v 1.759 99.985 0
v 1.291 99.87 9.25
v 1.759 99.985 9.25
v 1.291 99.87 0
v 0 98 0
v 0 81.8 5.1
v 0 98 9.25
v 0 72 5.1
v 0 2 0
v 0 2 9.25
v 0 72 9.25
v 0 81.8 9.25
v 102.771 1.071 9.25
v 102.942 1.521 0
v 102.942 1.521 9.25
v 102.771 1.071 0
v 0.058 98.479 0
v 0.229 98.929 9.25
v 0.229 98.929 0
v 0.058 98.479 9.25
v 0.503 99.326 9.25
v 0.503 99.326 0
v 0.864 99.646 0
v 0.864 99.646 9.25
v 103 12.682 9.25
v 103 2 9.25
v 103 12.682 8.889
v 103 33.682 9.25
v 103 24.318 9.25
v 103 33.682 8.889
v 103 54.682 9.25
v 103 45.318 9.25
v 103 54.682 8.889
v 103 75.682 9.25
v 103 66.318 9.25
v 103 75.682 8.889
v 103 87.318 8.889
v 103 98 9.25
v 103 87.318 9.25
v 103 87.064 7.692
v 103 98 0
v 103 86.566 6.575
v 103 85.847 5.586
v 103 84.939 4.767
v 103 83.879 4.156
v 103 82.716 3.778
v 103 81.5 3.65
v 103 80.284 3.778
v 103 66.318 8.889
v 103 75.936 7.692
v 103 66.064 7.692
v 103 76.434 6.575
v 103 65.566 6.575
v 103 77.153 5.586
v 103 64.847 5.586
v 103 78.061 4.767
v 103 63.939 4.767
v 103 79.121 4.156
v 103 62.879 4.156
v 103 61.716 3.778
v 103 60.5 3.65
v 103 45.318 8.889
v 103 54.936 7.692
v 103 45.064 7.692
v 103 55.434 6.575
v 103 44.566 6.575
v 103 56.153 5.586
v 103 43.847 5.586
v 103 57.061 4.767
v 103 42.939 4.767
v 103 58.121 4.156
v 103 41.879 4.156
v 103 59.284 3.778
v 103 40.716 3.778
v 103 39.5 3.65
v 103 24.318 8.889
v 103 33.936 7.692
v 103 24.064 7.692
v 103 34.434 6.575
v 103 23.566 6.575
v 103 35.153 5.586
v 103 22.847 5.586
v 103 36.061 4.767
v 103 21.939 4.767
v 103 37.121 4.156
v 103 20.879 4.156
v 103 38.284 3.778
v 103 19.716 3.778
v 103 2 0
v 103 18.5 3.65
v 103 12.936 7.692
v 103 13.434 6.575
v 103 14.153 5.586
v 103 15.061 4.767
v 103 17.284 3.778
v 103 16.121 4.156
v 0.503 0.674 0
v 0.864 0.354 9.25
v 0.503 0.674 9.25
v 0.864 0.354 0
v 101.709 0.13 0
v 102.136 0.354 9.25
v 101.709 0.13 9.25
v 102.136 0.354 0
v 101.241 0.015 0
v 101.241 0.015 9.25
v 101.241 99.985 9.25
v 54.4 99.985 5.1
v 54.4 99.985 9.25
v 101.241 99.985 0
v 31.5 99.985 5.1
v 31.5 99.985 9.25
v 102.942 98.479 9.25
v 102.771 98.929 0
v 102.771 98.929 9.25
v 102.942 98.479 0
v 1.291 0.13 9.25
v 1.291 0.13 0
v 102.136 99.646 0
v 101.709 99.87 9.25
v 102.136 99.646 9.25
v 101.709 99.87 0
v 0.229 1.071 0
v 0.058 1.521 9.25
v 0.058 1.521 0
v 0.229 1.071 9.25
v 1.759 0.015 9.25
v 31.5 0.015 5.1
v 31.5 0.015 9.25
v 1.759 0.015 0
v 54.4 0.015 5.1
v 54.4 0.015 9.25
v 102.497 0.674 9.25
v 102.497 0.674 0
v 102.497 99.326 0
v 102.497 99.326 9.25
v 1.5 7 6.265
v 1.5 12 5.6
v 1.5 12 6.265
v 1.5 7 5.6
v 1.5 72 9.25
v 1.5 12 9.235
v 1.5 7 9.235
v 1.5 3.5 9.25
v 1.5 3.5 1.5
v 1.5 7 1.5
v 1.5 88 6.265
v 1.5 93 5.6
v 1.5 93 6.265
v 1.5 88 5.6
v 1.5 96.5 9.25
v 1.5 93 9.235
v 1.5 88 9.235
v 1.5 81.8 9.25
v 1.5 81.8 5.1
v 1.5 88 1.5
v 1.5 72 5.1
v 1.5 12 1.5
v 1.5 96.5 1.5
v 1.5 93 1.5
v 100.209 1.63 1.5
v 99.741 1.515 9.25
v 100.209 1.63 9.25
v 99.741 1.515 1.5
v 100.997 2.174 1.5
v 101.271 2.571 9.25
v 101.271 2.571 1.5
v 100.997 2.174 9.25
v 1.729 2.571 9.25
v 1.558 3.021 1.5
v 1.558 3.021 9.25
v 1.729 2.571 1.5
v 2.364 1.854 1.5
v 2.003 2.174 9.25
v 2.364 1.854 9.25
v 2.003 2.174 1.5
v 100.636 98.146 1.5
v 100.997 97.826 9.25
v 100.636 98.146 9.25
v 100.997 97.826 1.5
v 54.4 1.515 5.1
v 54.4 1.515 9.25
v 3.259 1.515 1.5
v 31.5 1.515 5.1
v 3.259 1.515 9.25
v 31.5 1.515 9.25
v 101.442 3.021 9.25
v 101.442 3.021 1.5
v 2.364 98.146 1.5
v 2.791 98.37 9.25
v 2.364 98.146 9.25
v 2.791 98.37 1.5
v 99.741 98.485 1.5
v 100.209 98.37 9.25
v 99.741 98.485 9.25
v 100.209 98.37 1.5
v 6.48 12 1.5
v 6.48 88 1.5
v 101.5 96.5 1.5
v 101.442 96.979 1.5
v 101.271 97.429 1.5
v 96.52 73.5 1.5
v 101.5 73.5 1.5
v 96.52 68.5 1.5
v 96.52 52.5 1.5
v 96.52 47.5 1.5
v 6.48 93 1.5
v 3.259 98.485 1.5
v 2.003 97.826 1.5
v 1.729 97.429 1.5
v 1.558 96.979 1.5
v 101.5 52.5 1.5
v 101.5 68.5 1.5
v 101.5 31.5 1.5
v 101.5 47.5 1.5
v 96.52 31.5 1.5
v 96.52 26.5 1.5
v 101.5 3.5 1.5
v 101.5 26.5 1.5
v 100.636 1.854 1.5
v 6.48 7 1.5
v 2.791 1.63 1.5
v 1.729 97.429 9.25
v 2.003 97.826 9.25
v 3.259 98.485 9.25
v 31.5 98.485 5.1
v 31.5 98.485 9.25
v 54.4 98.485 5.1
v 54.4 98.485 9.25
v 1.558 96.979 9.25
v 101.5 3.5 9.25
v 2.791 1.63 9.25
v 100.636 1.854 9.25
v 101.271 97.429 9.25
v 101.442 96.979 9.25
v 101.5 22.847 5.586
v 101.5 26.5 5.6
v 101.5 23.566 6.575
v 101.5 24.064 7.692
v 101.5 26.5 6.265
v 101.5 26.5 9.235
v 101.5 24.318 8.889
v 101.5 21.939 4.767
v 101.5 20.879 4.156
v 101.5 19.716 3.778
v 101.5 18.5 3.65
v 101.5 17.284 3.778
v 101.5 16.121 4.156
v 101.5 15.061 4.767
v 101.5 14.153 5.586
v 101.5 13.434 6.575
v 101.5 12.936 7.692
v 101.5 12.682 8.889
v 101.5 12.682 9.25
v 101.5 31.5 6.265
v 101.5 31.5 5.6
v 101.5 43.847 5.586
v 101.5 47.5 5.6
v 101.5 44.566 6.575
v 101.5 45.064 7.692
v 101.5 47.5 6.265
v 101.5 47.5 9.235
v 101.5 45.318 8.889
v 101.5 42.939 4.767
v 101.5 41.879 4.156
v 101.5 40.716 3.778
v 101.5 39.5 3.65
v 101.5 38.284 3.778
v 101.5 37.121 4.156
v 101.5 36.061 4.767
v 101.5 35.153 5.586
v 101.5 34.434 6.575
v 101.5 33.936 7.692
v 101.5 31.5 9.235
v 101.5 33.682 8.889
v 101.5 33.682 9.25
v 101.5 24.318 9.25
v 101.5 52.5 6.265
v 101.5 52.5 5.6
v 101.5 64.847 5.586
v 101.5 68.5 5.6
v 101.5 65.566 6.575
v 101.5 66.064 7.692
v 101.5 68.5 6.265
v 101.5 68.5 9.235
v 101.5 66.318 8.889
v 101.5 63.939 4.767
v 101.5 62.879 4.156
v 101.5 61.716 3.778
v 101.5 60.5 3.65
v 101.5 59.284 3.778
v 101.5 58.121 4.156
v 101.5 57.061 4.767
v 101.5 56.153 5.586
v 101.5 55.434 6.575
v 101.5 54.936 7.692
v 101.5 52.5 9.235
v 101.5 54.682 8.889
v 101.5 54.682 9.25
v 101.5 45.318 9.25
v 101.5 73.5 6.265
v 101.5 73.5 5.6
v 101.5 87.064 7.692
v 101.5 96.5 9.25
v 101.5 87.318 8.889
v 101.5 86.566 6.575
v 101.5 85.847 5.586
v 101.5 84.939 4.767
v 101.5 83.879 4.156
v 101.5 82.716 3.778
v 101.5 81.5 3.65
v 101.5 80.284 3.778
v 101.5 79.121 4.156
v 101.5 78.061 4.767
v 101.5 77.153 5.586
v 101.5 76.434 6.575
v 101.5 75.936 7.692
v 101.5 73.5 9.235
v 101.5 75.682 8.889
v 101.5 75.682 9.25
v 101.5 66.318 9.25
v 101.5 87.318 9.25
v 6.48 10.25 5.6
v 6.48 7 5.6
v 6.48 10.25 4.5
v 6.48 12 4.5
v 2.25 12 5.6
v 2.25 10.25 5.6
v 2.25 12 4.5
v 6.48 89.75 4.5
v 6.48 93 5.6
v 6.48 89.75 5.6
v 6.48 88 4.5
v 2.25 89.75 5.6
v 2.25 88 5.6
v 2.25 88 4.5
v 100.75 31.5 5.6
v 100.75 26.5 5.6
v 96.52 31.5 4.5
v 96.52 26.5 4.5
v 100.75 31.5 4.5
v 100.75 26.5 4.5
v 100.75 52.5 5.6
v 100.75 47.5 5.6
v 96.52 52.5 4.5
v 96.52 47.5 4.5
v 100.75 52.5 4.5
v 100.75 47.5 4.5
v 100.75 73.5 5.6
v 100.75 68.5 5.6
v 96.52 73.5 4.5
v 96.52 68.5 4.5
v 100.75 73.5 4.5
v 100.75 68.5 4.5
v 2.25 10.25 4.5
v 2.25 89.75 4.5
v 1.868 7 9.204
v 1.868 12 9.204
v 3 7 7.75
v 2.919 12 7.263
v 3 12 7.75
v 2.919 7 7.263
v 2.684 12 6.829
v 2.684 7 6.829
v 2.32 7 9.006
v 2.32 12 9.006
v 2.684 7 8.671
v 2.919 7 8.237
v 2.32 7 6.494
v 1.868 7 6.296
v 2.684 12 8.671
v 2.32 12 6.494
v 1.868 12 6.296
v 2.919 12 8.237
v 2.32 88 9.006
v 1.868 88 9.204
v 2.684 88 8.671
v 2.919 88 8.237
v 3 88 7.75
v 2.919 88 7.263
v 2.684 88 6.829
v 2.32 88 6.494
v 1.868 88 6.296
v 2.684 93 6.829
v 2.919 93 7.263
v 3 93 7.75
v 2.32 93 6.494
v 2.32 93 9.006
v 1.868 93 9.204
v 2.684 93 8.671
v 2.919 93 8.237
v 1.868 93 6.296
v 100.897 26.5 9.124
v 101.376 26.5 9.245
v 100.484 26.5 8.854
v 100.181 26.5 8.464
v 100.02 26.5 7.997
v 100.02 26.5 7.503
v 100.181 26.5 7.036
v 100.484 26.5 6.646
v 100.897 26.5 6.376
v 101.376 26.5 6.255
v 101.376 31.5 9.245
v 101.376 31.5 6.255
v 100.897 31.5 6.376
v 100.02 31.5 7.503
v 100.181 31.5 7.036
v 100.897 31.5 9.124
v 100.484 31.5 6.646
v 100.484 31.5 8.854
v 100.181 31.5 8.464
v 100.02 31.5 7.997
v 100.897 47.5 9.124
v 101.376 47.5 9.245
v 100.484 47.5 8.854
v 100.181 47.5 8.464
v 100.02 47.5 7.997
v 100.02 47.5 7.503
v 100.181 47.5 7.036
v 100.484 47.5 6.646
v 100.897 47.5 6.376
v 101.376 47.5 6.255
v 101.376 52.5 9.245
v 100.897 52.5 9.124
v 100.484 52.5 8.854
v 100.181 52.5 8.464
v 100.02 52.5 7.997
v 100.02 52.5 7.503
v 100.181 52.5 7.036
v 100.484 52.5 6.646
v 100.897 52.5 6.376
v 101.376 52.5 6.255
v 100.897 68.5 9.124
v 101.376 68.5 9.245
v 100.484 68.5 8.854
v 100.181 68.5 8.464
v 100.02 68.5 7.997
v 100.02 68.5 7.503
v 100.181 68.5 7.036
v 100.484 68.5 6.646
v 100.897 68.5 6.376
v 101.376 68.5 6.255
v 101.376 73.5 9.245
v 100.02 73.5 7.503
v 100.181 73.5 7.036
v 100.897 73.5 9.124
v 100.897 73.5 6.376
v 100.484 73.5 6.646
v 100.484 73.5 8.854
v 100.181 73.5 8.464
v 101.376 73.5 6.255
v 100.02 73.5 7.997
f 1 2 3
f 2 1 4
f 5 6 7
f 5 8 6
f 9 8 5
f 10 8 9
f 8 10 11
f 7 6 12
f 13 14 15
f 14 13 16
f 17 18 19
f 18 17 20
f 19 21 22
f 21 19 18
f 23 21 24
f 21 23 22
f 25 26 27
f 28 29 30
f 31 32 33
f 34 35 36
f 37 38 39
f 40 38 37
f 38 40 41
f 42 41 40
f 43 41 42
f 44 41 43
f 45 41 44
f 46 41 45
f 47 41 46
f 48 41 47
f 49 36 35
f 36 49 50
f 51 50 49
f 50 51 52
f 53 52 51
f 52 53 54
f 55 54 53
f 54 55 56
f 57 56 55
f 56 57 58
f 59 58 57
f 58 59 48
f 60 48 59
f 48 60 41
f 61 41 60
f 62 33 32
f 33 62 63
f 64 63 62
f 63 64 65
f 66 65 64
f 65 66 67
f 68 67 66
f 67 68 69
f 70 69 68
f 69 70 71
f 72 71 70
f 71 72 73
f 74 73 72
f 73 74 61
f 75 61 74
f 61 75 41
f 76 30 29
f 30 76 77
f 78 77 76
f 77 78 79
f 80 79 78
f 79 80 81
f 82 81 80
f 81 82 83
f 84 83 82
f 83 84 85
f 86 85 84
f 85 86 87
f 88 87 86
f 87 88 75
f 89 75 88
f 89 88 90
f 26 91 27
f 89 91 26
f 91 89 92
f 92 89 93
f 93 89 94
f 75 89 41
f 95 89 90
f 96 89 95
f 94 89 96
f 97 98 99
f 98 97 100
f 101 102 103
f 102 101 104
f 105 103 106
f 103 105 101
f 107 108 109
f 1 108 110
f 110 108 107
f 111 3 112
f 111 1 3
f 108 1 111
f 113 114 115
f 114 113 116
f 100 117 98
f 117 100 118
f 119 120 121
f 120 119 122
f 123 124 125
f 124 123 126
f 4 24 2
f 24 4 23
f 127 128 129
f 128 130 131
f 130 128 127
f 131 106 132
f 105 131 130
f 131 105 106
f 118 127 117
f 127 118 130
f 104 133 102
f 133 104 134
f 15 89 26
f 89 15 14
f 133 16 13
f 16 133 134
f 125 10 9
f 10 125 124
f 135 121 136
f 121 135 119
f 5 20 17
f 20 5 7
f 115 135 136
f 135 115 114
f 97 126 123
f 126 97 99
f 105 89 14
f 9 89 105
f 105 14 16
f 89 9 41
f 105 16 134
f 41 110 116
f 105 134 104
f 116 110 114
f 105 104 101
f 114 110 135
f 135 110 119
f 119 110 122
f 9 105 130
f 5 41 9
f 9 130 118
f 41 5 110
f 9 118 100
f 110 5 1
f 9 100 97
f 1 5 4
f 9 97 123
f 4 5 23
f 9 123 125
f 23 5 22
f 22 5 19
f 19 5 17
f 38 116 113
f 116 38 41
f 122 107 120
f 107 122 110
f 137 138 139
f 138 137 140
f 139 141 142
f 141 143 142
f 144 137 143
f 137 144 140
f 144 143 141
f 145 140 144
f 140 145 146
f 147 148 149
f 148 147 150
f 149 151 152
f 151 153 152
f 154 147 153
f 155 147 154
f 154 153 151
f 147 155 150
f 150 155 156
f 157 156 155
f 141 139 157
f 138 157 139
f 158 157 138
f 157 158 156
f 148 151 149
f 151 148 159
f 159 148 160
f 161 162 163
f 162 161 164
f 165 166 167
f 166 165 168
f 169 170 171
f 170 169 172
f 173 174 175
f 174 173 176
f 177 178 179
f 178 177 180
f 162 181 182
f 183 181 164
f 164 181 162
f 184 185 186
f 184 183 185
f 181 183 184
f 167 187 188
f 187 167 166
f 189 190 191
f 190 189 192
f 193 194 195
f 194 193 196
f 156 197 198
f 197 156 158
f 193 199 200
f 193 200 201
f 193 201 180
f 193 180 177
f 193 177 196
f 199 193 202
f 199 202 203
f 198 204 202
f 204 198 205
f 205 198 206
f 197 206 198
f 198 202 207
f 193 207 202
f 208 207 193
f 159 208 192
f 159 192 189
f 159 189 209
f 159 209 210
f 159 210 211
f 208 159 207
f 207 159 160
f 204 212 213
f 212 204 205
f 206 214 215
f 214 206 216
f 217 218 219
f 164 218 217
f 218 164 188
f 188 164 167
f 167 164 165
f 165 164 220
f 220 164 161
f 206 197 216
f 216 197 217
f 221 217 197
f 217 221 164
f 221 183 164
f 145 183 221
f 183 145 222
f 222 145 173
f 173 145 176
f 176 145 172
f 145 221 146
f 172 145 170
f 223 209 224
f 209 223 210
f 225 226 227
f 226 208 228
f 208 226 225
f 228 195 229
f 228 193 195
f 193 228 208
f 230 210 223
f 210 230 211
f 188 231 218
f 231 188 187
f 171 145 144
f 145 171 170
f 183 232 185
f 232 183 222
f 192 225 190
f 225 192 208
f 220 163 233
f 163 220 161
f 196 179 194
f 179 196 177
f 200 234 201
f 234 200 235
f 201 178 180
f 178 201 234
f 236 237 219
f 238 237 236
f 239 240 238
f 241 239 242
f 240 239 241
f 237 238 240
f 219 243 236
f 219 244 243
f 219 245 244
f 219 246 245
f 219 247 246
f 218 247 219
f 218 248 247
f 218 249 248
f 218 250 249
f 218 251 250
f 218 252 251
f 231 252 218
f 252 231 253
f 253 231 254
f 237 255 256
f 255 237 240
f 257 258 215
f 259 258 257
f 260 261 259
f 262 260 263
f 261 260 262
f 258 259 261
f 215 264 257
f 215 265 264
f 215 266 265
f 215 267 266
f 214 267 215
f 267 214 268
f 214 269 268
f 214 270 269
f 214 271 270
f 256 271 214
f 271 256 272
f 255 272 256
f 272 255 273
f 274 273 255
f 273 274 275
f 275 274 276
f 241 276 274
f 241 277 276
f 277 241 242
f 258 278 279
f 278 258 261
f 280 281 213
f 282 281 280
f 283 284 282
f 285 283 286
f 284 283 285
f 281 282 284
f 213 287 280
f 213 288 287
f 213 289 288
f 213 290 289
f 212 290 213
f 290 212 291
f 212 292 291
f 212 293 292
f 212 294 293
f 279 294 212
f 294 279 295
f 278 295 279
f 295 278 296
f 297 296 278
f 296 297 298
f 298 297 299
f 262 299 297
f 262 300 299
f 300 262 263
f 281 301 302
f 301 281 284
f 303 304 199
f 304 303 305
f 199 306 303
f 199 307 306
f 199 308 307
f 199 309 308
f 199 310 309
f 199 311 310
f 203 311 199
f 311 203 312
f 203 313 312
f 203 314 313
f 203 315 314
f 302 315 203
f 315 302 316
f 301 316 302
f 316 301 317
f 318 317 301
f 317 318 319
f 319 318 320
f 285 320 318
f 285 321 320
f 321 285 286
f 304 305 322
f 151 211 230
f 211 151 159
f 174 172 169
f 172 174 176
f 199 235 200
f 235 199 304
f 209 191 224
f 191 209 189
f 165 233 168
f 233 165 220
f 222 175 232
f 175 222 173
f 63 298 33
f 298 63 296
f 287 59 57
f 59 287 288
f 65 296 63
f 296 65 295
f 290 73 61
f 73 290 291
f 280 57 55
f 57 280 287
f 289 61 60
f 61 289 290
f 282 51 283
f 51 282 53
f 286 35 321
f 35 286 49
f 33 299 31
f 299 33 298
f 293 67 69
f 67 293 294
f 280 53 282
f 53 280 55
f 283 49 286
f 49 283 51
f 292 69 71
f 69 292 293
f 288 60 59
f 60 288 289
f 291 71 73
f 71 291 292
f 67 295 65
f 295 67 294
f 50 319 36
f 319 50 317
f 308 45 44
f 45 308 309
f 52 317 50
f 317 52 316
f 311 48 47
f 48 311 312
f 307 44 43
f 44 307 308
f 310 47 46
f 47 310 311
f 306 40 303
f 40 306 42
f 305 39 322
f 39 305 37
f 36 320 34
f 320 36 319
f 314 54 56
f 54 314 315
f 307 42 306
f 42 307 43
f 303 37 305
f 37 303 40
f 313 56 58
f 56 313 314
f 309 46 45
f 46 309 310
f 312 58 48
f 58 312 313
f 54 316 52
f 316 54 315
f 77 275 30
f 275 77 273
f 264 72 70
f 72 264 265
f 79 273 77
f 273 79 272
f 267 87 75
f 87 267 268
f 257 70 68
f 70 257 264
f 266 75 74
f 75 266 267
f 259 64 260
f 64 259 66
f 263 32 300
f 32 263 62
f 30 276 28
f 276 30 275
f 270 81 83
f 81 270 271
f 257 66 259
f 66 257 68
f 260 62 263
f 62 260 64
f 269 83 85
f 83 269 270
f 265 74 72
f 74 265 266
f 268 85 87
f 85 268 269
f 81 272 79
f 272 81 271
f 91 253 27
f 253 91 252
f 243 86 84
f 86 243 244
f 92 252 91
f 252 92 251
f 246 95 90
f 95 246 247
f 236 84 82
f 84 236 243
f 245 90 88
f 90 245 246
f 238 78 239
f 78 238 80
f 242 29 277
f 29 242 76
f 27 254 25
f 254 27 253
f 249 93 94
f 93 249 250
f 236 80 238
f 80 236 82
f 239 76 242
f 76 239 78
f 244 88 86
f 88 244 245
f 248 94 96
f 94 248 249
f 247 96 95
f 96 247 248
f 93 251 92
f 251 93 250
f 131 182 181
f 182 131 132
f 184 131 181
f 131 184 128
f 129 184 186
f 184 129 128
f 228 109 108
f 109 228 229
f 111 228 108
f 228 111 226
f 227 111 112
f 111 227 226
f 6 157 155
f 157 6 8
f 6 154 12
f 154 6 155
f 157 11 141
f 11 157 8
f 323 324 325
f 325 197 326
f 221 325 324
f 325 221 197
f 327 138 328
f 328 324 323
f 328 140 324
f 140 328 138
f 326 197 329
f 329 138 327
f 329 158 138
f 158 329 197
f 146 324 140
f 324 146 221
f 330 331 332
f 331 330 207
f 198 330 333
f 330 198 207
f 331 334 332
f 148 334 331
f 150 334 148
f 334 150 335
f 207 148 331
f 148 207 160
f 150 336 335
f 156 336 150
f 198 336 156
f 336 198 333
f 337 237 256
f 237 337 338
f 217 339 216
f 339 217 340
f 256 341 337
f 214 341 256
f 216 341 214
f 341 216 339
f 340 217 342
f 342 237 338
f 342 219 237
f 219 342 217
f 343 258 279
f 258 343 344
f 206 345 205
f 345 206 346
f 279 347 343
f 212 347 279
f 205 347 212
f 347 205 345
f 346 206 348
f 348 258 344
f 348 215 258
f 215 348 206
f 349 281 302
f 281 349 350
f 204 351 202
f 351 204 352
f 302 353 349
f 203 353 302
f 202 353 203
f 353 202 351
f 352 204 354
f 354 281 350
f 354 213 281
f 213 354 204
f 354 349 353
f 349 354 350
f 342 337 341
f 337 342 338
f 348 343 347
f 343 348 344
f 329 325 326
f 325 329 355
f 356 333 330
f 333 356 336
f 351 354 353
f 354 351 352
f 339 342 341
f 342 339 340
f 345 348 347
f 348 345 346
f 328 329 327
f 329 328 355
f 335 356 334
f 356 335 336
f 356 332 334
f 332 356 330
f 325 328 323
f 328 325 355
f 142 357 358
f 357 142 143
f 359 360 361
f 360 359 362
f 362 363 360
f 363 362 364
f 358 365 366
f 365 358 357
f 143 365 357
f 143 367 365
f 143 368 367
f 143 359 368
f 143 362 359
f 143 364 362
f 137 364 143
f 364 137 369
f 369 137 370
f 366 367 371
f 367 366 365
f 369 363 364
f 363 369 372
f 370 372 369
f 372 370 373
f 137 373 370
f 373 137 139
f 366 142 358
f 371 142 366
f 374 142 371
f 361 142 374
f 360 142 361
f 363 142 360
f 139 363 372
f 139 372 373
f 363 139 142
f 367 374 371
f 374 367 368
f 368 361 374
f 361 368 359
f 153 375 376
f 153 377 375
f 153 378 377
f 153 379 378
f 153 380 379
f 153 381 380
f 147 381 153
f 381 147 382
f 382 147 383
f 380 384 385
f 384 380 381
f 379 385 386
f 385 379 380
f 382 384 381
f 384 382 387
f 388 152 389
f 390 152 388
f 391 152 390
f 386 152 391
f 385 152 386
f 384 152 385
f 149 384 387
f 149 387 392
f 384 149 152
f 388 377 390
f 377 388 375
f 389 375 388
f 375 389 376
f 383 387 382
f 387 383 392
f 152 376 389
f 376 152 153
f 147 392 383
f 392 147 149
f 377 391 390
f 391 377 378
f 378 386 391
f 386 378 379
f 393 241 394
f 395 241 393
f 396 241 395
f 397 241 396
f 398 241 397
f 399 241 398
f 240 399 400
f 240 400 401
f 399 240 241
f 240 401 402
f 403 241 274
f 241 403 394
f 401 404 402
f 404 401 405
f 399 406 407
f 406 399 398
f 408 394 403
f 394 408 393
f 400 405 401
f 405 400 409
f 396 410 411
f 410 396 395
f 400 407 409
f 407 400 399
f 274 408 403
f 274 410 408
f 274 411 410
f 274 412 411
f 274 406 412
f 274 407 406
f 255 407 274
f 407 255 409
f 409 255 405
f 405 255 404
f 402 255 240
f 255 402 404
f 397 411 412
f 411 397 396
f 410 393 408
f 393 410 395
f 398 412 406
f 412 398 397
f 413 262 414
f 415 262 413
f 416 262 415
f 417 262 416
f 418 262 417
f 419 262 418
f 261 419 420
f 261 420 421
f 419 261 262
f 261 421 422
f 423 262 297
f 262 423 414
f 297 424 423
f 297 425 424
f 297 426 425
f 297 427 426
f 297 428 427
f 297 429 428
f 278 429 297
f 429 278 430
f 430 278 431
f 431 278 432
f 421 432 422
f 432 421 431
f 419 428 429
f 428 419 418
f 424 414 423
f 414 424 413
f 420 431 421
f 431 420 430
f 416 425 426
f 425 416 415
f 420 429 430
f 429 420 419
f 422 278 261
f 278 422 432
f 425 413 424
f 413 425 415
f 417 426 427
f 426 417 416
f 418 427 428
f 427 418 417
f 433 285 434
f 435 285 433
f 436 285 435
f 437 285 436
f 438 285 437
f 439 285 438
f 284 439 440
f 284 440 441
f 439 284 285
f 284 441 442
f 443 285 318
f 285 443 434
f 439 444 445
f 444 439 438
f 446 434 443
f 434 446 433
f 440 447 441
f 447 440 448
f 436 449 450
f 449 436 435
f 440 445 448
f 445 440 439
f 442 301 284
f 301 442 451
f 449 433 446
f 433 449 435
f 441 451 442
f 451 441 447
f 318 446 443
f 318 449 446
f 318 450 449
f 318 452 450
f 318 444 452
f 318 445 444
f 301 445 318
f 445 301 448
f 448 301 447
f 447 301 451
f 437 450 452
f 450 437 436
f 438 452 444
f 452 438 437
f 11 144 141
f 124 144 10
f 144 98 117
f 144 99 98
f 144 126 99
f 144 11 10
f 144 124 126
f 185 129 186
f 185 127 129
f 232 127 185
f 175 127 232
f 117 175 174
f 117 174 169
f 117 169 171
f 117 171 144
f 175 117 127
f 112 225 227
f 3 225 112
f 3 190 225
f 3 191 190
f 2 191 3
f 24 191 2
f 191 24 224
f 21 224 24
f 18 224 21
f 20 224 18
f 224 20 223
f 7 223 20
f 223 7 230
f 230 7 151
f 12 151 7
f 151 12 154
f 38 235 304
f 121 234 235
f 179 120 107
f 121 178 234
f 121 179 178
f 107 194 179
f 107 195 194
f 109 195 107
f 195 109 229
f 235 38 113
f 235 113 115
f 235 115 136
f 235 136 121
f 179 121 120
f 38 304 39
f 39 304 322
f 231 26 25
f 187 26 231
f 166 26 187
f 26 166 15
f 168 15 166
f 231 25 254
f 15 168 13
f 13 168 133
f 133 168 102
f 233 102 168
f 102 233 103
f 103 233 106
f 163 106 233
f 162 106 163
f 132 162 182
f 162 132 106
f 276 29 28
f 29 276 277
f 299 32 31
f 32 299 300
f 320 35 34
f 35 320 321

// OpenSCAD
// Case for a Haasoscope
//
// Copyright (C) 2022  Kevin O'Connor <kevin@koconnor.net>
//
// This file may be distributed under the terms of the GNU GPLv3 license.

board_length = 98;
board_width = 79;
board_height = 1.6;
board_height_components_bottom = 2;
board_height_components_top = 16.5;
coax_diameter = 9.7;
board_height_offset_coax = 3.4;
board_coax_width_separation = 21;
dupont_length = 20.9;
dupont_width = 9;
dupont_height = 2.5;
board_length_offset_dupont = 30;
double_switch_length = 19;
double_switch_length_left = 20;
double_switch_width = 3.6;
double_switch_height = 3.2;
board_length_offset_double_switch_outer = 16;
board_length_offset_double_switch_inner = 10;
board_width_offset_double_switch_outer = 3;
board_width_offset_double_switch_inner = (board_width-double_switch_width-10)/2;
topdupont_width = 5;
board_width_offset_topdupont_left = 13;
board_width_offset_topdupont_right = 11;
usb_width = 7.8;
usb_height = 2.8;
board_width_offset_usb = 6.7;
usbhi_length = 13.5;
usbhi_height = 7;
board_length_offset_usbhi = 7.5;
board_height_offset_usbhi = 8.25;
jtag_length = 20.25;
jtag_width = 9;
board_width_offset_jtag = 1.5;
board_length_offset_jtag = 4.5;
board_length_offset_hole = 12;

wall_size = 1.5;
post_size = 5;
corner_fillet = 2;

slack = 1;
CUT = 0.02;
$fs = 0.5;

// Full case
board_x = wall_size + slack;
board_y = wall_size + dupont_width;
board_z = wall_size + slack + board_height_components_bottom;
coax_center_z = board_z + board_height + board_height_offset_coax;
case_length = board_x + board_length + wall_size + slack;
case_width = board_y + board_width + dupont_width + wall_size;
case_height = board_z + board_height + board_height_components_top + wall_size;
post_y_offset = 3.5;
post_min_y = [board_y - post_y_offset,
               board_y + board_width + post_y_offset - post_size];
post_center_y = (case_width - post_size) / 2;
post_max_y = [post_center_y - board_coax_width_separation, post_center_y,
              post_center_y + board_coax_width_separation];
bottom_height = coax_center_z - slack/4;
module case() {
    module base_box() {
        module fillet_box(length, width, height) {
            hull() {
                x1 = corner_fillet;
                x2 = length - corner_fillet;
                y1 = corner_fillet;
                y2 = width - corner_fillet;
                for (x=[x1, x2])
                    for (y=[y1, y2])
                        translate([x, y, 0])
                            cylinder(r=corner_fillet, h=height);
            }
        }
        difference() {
            fillet_box(case_length, case_width, case_height);
            translate([wall_size, wall_size, wall_size])
                fillet_box(case_length-2*wall_size, case_width-2*wall_size,
                           case_height-2*wall_size);
        }
    }
    module coax_holes() {
        coax_adj_dia = coax_diameter + 2*slack;
        module coax_hole() {
            rotate([0, 90, 0])
                cylinder(d=coax_adj_dia, h=wall_size+2*CUT);
        }
        center_y = case_width / 2;
        sep = board_coax_width_separation;
        translate([case_length-wall_size-CUT, 0, coax_center_z]) {
            for (m=[-0.5, -1.5, 0.5, 1.5])
                translate([0, center_y - m*sep, 0])
                    coax_hole();
        }
    }
    module dupont_holes() {
        dupont_x = board_x + board_length_offset_dupont - slack;
        dupont_z = board_z + board_height - slack;
        module dupont_hole() {
            translate([dupont_x, -CUT, dupont_z])
                cube(size=[dupont_length+2*slack, wall_size+2*CUT,
                           dupont_height+2*slack]);
        }
        dupont_hole();
        translate([0, case_width - wall_size, 0])
            dupont_hole();
    }
    module usb_hole() {
        usb_adj_width = usb_width + 2*slack;
        usb_y = (board_y + board_width
                 - board_width_offset_usb - usb_adj_width - slack);
        usb_z = board_z + board_height - slack;
        translate([-CUT, usb_y, usb_z]) {
            cube([wall_size+2*CUT, usb_adj_width, usb_height + 2*slack]);
        }
    }
    module usbhi_hole() {
        usbhi_adj_length = usbhi_length + 2*slack;
        usbhi_x = board_x + board_length_offset_usbhi - slack;
        usbhi_z = board_z + board_height + board_height_offset_usbhi - slack;
        translate([usbhi_x, case_width-wall_size-CUT, usbhi_z]) {
            cube([usbhi_adj_length, wall_size+2*CUT, usbhi_height + 2*slack]);
        }
    }
    module top_holes() {
        board_max_x = board_x + board_length;
        board_max_y = board_y + board_width;
        dsor_x = (board_max_x - board_length_offset_double_switch_outer
                  - double_switch_length);
        dsol_x = (board_max_x - board_length_offset_double_switch_outer
                  - double_switch_length_left);
        dsi_x = (board_max_x - board_length_offset_double_switch_inner
                 - double_switch_length_left);
        dsor_y = (board_max_y - board_width_offset_double_switch_outer
                  - double_switch_width);
        dsir_y = (board_max_y - board_width_offset_double_switch_inner
                  - double_switch_width);
        dsol_y = board_y + board_width_offset_double_switch_outer;
        dsil_y = board_y + board_width_offset_double_switch_inner;
        dsw = double_switch_width;
        dsl = double_switch_length;
        td_x = board_x + board_length_offset_dupont;
        tdl_y = board_y + board_width_offset_topdupont_left;
        tdr_y = (board_max_y - board_width_offset_topdupont_right
                 - topdupont_width);
        jtag_x = board_x + board_length_offset_jtag - slack;
        jtag_y = board_y + board_width_offset_jtag - slack;
        tholes = [[dsol_x, dsol_y, dsl, dsw], [dsi_x, dsil_y, dsl, dsw],
                  [dsi_x, dsir_y, dsl, dsw], [dsor_x, dsor_y, dsl, dsw],
                  [td_x, tdl_y, dupont_length, topdupont_width],
                  [td_x, tdr_y, dupont_length, topdupont_width],
                  [jtag_x, jtag_y, jtag_length+2*slack, jtag_width+2*slack],
                 ];
        module top_hole(x, y, length, width) {
            translate([x, y, case_height-wall_size-CUT])
                cube([length, width, wall_size+2*CUT]);
        }
        for (thole=tholes)
            top_hole(thole[0], thole[1], thole[2], thole[3]);
    }
    module box_with_holes() {
        difference() {
            base_box();
            coax_holes();
            dupont_holes();
            usb_hole();
            usbhi_hole();
            top_holes();
        }
    }
    module board_posts() {
        post_height = board_z + board_height - slack/2;
        module post(x, y) {
            translate([x, y, 0])
                cube([post_size, post_size, post_height]);
        }
        module posts() {
            px1 = wall_size-CUT;
            px2 = case_length - wall_size - post_size + CUT;
            for (py=post_min_y)
                post(px1, py);
            for (py=post_max_y)
                post(px2, py);
        }
        module board_cut() {
            translate([board_x - slack/4, board_y - slack/4, board_z])
                cube([board_length + slack/2, board_width + slack/2,
                      board_height + CUT]);
        }
        difference() {
            posts();
            board_cut();
        }
    }
    module notches() {
        module notch(x, y) {
            notch_radius = wall_size;
            translate([x, y, bottom_height - notch_radius])
                rotate([-90, 0, 0])
                    cylinder(h=post_size, r=notch_radius);
        }
        for (py=post_min_y)
            notch(wall_size, py);
        for (py=post_max_y)
            notch(case_length-wall_size, py);
    }
    box_with_holes();
    board_posts();
    notches();
}

// Just the bottom of the case
module case_bottom() {
    intersection() {
        case();
        translate([-CUT, -CUT, -CUT])
            cube([case_length+2*CUT, case_width+2*CUT, bottom_height+CUT]);
    }
}

// The top of the case
module case_top() {
    top_post_width_extra = 1.5;
    top_post_width = post_size + 2*top_post_width_extra;
    top_post_z = board_z + board_height + slack/2;
    module board_posts() {
        top_post_height = case_height - top_post_z;
        module post(x, y) {
            translate([x, y-top_post_width_extra, top_post_z])
                cube([post_size, top_post_width, top_post_height]);
        }
        module posts() {
            px1 = wall_size - CUT;
            px2 = case_length - wall_size - post_size + CUT;
            for (py=post_min_y)
                post(px1, py);
            for (py=post_max_y)
                post(px2, py);
        }
        posts();
    }
    module notches() {
        module notch(x, y) {
            notch_radius = wall_size;
            translate([x, y, bottom_height - notch_radius])
                rotate([-90, 0, 0])
                    cylinder(h=post_size, r=notch_radius);
        }
        for (py=post_min_y)
            notch(wall_size, py);
        for (py=post_max_y)
            notch(case_length-wall_size, py);
    }
    topbot_slack = slack/4;
    top_height = case_height - bottom_height - topbot_slack;
    module only_top() {
        intersection() {
            case();
            translate([-CUT, -CUT, bottom_height + topbot_slack])
                cube([case_length+2*CUT, case_width+2*CUT, top_height+CUT]);
        }
        difference() {
            board_posts();
            notches();
        }
    }
    only_top();
}

// Both top and bottom (view for debugging)
module case_both() {
    case_top();
    case_bottom();
}

// The top of the case rotated for 3d printing
module case_rotated_top() {
    rotate([180, 0, 0])
        case_top();
}

// Object selection
case_bottom();
//case_rotated_top();
